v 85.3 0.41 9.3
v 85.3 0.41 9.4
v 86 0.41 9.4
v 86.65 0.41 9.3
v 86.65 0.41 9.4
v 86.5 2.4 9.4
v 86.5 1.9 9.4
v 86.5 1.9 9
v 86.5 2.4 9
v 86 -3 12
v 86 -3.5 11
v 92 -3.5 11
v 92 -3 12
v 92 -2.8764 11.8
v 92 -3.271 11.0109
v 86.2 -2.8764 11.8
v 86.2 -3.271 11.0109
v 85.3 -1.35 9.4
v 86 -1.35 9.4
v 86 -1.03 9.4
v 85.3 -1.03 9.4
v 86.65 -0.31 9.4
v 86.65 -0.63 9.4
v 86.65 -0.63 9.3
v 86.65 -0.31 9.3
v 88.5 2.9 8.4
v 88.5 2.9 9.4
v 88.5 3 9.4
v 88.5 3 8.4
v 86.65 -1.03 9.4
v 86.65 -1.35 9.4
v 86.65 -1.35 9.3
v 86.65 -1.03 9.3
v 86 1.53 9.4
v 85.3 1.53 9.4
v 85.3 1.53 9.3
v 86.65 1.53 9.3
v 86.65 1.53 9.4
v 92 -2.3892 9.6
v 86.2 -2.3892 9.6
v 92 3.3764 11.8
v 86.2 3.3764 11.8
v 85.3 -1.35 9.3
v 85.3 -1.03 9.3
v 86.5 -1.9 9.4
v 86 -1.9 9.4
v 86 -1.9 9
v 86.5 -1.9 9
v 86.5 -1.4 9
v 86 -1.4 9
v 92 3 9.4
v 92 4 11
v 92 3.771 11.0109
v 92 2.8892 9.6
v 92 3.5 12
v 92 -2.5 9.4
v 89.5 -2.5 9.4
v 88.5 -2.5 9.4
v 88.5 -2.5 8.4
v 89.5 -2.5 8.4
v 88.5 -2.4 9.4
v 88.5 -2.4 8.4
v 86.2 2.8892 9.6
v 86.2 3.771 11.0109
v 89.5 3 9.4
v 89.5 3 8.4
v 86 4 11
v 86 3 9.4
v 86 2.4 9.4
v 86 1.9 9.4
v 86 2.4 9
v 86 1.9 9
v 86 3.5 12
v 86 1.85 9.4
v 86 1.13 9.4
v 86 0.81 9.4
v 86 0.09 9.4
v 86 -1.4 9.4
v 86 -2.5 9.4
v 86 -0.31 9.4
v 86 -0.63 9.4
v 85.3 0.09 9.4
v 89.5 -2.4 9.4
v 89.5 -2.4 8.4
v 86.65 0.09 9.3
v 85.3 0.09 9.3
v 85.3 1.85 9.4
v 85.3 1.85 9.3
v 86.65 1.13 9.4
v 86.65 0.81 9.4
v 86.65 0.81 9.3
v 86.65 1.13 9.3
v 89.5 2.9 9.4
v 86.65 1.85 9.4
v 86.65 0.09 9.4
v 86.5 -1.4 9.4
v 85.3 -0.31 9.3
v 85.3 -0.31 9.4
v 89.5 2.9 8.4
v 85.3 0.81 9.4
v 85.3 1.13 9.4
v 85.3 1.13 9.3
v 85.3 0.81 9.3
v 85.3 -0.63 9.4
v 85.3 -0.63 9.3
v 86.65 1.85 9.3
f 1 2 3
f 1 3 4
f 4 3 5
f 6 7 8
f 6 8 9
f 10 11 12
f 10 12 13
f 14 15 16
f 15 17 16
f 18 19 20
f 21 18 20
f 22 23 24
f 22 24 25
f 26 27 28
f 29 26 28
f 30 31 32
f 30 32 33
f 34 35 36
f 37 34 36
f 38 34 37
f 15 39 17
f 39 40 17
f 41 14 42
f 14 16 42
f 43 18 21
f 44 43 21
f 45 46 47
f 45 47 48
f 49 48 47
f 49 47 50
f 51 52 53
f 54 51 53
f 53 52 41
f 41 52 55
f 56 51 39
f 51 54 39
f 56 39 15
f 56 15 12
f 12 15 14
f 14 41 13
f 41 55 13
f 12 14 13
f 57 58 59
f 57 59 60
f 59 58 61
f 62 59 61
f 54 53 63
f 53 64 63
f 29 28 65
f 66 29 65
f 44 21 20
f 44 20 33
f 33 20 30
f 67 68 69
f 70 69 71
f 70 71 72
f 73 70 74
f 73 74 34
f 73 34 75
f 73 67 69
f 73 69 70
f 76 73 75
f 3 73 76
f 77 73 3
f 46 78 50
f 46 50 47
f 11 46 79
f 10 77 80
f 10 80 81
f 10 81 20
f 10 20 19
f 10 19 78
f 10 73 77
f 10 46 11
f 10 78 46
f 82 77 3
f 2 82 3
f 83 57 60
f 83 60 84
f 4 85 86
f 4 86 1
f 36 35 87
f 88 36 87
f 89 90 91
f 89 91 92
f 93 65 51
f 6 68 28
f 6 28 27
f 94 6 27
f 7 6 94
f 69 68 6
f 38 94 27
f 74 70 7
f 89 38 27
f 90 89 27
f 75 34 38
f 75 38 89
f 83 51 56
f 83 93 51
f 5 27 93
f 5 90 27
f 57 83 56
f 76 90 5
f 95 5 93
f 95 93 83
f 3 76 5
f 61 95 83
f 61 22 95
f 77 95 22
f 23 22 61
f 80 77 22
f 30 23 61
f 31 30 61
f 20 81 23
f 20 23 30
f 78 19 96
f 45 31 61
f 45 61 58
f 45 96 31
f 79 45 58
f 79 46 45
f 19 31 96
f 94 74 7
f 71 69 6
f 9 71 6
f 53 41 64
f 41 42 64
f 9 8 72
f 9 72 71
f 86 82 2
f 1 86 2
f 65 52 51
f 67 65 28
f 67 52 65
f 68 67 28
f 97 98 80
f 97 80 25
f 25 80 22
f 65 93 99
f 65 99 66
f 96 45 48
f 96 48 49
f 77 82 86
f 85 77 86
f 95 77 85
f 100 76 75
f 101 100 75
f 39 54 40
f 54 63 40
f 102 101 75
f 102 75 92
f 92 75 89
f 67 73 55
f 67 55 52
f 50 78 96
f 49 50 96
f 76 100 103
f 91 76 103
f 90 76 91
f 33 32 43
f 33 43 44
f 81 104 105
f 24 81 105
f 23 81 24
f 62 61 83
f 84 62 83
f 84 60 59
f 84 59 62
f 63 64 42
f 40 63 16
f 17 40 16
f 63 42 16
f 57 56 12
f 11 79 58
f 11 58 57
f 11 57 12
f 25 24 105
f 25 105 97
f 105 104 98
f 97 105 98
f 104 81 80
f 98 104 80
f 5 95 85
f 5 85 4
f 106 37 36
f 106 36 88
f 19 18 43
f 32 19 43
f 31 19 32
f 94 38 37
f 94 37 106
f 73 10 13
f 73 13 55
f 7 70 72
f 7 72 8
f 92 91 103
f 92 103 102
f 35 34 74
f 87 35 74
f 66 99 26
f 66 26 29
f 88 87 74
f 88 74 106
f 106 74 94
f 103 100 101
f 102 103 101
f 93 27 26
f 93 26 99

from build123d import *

# Parameters (mm, degrees)
PAD004_DEPTH            = 6
THICKNESS_T             = -0.2
SKETCH016_W             = 0.1
SKETCH016_H             = 1
PAD005_DEPTH            = 1
SKETCH017_W             = 0.5
SKETCH017_H             = 0.5
PAD006_DEPTH            = 0.4
SKETCH018_W             = 0.32
SKETCH018_H             = 1.35
PAD007_DEPTH            = 0.1
BODY002_ROLL_ANGLE      = 90
BODY002_PLACEMENT_ANGLE = 90


with BuildPart() as part:
    # Sketch015 → Pad004 (new body)
    with BuildSketch(Plane.XY):
        Polygon((0, 0), (6.5, 0), (7, -1), (6, -2.6), (0.5, -2.6), (-0.5, -1), align=None)
    extrude(amount=PAD004_DEPTH)

    # Thickness
    thickness_openings = [part.faces().sort_by_distance(p)[0] for p in [
        (3.25, -1.25728, 6),
    ]]
    offset(amount=THICKNESS_T, openings=thickness_openings)

    # Sketch016 (on Face5 of Thickness) → Pad005 (join)
    with BuildSketch(Plane.XZ.offset(2.6)):
        with Locations((5.95, 3)):
            Rectangle(SKETCH016_W, SKETCH016_H)
        with Locations((0.55, 3)):
            Rectangle(SKETCH016_W, SKETCH016_H)
    extrude(amount=PAD005_DEPTH)

    # Sketch017 (on Face7 of Pad005) → Pad006 (join)
    with BuildSketch(Plane.XZ.offset(2.6)):
        with Locations((1.35, 0.25)):
            Rectangle(SKETCH017_W, SKETCH017_H)
        with Locations((5.15, 0.25)):
            Rectangle(SKETCH017_W, SKETCH017_H)
    extrude(amount=PAD006_DEPTH)

    # Sketch018 (on Face7 of Pad006) → Pad007 (join)
    with BuildSketch(Plane.XZ.offset(2.6)):
        with Locations((1.81, -0.025)):
            Rectangle(SKETCH018_W, SKETCH018_H)
        with Locations((2.53, -0.025)):
            Rectangle(SKETCH018_W, SKETCH018_H)
        with Locations((3.25, -0.025)):
            Rectangle(SKETCH018_W, SKETCH018_H)
        with Locations((3.97, -0.025)):
            Rectangle(SKETCH018_W, SKETCH018_H)
        with Locations((4.69, -0.025)):
            Rectangle(SKETCH018_W, SKETCH018_H)
    extrude(amount=PAD007_DEPTH)


with BuildPart() as part_1:
    # Body002 roll: moved
    add(part.part.rotate(Axis((0, 0, 0), (1, 0, 0)), BODY002_ROLL_ANGLE))


with BuildPart() as part_2:
    # Body002 placement: moved
    add(part_1.part.moved(Location((86, -3, 12))).rotate(Axis((86, -3, 12), (0, 0, 1)), BODY002_PLACEMENT_ANGLE))


solid = part_2.part
